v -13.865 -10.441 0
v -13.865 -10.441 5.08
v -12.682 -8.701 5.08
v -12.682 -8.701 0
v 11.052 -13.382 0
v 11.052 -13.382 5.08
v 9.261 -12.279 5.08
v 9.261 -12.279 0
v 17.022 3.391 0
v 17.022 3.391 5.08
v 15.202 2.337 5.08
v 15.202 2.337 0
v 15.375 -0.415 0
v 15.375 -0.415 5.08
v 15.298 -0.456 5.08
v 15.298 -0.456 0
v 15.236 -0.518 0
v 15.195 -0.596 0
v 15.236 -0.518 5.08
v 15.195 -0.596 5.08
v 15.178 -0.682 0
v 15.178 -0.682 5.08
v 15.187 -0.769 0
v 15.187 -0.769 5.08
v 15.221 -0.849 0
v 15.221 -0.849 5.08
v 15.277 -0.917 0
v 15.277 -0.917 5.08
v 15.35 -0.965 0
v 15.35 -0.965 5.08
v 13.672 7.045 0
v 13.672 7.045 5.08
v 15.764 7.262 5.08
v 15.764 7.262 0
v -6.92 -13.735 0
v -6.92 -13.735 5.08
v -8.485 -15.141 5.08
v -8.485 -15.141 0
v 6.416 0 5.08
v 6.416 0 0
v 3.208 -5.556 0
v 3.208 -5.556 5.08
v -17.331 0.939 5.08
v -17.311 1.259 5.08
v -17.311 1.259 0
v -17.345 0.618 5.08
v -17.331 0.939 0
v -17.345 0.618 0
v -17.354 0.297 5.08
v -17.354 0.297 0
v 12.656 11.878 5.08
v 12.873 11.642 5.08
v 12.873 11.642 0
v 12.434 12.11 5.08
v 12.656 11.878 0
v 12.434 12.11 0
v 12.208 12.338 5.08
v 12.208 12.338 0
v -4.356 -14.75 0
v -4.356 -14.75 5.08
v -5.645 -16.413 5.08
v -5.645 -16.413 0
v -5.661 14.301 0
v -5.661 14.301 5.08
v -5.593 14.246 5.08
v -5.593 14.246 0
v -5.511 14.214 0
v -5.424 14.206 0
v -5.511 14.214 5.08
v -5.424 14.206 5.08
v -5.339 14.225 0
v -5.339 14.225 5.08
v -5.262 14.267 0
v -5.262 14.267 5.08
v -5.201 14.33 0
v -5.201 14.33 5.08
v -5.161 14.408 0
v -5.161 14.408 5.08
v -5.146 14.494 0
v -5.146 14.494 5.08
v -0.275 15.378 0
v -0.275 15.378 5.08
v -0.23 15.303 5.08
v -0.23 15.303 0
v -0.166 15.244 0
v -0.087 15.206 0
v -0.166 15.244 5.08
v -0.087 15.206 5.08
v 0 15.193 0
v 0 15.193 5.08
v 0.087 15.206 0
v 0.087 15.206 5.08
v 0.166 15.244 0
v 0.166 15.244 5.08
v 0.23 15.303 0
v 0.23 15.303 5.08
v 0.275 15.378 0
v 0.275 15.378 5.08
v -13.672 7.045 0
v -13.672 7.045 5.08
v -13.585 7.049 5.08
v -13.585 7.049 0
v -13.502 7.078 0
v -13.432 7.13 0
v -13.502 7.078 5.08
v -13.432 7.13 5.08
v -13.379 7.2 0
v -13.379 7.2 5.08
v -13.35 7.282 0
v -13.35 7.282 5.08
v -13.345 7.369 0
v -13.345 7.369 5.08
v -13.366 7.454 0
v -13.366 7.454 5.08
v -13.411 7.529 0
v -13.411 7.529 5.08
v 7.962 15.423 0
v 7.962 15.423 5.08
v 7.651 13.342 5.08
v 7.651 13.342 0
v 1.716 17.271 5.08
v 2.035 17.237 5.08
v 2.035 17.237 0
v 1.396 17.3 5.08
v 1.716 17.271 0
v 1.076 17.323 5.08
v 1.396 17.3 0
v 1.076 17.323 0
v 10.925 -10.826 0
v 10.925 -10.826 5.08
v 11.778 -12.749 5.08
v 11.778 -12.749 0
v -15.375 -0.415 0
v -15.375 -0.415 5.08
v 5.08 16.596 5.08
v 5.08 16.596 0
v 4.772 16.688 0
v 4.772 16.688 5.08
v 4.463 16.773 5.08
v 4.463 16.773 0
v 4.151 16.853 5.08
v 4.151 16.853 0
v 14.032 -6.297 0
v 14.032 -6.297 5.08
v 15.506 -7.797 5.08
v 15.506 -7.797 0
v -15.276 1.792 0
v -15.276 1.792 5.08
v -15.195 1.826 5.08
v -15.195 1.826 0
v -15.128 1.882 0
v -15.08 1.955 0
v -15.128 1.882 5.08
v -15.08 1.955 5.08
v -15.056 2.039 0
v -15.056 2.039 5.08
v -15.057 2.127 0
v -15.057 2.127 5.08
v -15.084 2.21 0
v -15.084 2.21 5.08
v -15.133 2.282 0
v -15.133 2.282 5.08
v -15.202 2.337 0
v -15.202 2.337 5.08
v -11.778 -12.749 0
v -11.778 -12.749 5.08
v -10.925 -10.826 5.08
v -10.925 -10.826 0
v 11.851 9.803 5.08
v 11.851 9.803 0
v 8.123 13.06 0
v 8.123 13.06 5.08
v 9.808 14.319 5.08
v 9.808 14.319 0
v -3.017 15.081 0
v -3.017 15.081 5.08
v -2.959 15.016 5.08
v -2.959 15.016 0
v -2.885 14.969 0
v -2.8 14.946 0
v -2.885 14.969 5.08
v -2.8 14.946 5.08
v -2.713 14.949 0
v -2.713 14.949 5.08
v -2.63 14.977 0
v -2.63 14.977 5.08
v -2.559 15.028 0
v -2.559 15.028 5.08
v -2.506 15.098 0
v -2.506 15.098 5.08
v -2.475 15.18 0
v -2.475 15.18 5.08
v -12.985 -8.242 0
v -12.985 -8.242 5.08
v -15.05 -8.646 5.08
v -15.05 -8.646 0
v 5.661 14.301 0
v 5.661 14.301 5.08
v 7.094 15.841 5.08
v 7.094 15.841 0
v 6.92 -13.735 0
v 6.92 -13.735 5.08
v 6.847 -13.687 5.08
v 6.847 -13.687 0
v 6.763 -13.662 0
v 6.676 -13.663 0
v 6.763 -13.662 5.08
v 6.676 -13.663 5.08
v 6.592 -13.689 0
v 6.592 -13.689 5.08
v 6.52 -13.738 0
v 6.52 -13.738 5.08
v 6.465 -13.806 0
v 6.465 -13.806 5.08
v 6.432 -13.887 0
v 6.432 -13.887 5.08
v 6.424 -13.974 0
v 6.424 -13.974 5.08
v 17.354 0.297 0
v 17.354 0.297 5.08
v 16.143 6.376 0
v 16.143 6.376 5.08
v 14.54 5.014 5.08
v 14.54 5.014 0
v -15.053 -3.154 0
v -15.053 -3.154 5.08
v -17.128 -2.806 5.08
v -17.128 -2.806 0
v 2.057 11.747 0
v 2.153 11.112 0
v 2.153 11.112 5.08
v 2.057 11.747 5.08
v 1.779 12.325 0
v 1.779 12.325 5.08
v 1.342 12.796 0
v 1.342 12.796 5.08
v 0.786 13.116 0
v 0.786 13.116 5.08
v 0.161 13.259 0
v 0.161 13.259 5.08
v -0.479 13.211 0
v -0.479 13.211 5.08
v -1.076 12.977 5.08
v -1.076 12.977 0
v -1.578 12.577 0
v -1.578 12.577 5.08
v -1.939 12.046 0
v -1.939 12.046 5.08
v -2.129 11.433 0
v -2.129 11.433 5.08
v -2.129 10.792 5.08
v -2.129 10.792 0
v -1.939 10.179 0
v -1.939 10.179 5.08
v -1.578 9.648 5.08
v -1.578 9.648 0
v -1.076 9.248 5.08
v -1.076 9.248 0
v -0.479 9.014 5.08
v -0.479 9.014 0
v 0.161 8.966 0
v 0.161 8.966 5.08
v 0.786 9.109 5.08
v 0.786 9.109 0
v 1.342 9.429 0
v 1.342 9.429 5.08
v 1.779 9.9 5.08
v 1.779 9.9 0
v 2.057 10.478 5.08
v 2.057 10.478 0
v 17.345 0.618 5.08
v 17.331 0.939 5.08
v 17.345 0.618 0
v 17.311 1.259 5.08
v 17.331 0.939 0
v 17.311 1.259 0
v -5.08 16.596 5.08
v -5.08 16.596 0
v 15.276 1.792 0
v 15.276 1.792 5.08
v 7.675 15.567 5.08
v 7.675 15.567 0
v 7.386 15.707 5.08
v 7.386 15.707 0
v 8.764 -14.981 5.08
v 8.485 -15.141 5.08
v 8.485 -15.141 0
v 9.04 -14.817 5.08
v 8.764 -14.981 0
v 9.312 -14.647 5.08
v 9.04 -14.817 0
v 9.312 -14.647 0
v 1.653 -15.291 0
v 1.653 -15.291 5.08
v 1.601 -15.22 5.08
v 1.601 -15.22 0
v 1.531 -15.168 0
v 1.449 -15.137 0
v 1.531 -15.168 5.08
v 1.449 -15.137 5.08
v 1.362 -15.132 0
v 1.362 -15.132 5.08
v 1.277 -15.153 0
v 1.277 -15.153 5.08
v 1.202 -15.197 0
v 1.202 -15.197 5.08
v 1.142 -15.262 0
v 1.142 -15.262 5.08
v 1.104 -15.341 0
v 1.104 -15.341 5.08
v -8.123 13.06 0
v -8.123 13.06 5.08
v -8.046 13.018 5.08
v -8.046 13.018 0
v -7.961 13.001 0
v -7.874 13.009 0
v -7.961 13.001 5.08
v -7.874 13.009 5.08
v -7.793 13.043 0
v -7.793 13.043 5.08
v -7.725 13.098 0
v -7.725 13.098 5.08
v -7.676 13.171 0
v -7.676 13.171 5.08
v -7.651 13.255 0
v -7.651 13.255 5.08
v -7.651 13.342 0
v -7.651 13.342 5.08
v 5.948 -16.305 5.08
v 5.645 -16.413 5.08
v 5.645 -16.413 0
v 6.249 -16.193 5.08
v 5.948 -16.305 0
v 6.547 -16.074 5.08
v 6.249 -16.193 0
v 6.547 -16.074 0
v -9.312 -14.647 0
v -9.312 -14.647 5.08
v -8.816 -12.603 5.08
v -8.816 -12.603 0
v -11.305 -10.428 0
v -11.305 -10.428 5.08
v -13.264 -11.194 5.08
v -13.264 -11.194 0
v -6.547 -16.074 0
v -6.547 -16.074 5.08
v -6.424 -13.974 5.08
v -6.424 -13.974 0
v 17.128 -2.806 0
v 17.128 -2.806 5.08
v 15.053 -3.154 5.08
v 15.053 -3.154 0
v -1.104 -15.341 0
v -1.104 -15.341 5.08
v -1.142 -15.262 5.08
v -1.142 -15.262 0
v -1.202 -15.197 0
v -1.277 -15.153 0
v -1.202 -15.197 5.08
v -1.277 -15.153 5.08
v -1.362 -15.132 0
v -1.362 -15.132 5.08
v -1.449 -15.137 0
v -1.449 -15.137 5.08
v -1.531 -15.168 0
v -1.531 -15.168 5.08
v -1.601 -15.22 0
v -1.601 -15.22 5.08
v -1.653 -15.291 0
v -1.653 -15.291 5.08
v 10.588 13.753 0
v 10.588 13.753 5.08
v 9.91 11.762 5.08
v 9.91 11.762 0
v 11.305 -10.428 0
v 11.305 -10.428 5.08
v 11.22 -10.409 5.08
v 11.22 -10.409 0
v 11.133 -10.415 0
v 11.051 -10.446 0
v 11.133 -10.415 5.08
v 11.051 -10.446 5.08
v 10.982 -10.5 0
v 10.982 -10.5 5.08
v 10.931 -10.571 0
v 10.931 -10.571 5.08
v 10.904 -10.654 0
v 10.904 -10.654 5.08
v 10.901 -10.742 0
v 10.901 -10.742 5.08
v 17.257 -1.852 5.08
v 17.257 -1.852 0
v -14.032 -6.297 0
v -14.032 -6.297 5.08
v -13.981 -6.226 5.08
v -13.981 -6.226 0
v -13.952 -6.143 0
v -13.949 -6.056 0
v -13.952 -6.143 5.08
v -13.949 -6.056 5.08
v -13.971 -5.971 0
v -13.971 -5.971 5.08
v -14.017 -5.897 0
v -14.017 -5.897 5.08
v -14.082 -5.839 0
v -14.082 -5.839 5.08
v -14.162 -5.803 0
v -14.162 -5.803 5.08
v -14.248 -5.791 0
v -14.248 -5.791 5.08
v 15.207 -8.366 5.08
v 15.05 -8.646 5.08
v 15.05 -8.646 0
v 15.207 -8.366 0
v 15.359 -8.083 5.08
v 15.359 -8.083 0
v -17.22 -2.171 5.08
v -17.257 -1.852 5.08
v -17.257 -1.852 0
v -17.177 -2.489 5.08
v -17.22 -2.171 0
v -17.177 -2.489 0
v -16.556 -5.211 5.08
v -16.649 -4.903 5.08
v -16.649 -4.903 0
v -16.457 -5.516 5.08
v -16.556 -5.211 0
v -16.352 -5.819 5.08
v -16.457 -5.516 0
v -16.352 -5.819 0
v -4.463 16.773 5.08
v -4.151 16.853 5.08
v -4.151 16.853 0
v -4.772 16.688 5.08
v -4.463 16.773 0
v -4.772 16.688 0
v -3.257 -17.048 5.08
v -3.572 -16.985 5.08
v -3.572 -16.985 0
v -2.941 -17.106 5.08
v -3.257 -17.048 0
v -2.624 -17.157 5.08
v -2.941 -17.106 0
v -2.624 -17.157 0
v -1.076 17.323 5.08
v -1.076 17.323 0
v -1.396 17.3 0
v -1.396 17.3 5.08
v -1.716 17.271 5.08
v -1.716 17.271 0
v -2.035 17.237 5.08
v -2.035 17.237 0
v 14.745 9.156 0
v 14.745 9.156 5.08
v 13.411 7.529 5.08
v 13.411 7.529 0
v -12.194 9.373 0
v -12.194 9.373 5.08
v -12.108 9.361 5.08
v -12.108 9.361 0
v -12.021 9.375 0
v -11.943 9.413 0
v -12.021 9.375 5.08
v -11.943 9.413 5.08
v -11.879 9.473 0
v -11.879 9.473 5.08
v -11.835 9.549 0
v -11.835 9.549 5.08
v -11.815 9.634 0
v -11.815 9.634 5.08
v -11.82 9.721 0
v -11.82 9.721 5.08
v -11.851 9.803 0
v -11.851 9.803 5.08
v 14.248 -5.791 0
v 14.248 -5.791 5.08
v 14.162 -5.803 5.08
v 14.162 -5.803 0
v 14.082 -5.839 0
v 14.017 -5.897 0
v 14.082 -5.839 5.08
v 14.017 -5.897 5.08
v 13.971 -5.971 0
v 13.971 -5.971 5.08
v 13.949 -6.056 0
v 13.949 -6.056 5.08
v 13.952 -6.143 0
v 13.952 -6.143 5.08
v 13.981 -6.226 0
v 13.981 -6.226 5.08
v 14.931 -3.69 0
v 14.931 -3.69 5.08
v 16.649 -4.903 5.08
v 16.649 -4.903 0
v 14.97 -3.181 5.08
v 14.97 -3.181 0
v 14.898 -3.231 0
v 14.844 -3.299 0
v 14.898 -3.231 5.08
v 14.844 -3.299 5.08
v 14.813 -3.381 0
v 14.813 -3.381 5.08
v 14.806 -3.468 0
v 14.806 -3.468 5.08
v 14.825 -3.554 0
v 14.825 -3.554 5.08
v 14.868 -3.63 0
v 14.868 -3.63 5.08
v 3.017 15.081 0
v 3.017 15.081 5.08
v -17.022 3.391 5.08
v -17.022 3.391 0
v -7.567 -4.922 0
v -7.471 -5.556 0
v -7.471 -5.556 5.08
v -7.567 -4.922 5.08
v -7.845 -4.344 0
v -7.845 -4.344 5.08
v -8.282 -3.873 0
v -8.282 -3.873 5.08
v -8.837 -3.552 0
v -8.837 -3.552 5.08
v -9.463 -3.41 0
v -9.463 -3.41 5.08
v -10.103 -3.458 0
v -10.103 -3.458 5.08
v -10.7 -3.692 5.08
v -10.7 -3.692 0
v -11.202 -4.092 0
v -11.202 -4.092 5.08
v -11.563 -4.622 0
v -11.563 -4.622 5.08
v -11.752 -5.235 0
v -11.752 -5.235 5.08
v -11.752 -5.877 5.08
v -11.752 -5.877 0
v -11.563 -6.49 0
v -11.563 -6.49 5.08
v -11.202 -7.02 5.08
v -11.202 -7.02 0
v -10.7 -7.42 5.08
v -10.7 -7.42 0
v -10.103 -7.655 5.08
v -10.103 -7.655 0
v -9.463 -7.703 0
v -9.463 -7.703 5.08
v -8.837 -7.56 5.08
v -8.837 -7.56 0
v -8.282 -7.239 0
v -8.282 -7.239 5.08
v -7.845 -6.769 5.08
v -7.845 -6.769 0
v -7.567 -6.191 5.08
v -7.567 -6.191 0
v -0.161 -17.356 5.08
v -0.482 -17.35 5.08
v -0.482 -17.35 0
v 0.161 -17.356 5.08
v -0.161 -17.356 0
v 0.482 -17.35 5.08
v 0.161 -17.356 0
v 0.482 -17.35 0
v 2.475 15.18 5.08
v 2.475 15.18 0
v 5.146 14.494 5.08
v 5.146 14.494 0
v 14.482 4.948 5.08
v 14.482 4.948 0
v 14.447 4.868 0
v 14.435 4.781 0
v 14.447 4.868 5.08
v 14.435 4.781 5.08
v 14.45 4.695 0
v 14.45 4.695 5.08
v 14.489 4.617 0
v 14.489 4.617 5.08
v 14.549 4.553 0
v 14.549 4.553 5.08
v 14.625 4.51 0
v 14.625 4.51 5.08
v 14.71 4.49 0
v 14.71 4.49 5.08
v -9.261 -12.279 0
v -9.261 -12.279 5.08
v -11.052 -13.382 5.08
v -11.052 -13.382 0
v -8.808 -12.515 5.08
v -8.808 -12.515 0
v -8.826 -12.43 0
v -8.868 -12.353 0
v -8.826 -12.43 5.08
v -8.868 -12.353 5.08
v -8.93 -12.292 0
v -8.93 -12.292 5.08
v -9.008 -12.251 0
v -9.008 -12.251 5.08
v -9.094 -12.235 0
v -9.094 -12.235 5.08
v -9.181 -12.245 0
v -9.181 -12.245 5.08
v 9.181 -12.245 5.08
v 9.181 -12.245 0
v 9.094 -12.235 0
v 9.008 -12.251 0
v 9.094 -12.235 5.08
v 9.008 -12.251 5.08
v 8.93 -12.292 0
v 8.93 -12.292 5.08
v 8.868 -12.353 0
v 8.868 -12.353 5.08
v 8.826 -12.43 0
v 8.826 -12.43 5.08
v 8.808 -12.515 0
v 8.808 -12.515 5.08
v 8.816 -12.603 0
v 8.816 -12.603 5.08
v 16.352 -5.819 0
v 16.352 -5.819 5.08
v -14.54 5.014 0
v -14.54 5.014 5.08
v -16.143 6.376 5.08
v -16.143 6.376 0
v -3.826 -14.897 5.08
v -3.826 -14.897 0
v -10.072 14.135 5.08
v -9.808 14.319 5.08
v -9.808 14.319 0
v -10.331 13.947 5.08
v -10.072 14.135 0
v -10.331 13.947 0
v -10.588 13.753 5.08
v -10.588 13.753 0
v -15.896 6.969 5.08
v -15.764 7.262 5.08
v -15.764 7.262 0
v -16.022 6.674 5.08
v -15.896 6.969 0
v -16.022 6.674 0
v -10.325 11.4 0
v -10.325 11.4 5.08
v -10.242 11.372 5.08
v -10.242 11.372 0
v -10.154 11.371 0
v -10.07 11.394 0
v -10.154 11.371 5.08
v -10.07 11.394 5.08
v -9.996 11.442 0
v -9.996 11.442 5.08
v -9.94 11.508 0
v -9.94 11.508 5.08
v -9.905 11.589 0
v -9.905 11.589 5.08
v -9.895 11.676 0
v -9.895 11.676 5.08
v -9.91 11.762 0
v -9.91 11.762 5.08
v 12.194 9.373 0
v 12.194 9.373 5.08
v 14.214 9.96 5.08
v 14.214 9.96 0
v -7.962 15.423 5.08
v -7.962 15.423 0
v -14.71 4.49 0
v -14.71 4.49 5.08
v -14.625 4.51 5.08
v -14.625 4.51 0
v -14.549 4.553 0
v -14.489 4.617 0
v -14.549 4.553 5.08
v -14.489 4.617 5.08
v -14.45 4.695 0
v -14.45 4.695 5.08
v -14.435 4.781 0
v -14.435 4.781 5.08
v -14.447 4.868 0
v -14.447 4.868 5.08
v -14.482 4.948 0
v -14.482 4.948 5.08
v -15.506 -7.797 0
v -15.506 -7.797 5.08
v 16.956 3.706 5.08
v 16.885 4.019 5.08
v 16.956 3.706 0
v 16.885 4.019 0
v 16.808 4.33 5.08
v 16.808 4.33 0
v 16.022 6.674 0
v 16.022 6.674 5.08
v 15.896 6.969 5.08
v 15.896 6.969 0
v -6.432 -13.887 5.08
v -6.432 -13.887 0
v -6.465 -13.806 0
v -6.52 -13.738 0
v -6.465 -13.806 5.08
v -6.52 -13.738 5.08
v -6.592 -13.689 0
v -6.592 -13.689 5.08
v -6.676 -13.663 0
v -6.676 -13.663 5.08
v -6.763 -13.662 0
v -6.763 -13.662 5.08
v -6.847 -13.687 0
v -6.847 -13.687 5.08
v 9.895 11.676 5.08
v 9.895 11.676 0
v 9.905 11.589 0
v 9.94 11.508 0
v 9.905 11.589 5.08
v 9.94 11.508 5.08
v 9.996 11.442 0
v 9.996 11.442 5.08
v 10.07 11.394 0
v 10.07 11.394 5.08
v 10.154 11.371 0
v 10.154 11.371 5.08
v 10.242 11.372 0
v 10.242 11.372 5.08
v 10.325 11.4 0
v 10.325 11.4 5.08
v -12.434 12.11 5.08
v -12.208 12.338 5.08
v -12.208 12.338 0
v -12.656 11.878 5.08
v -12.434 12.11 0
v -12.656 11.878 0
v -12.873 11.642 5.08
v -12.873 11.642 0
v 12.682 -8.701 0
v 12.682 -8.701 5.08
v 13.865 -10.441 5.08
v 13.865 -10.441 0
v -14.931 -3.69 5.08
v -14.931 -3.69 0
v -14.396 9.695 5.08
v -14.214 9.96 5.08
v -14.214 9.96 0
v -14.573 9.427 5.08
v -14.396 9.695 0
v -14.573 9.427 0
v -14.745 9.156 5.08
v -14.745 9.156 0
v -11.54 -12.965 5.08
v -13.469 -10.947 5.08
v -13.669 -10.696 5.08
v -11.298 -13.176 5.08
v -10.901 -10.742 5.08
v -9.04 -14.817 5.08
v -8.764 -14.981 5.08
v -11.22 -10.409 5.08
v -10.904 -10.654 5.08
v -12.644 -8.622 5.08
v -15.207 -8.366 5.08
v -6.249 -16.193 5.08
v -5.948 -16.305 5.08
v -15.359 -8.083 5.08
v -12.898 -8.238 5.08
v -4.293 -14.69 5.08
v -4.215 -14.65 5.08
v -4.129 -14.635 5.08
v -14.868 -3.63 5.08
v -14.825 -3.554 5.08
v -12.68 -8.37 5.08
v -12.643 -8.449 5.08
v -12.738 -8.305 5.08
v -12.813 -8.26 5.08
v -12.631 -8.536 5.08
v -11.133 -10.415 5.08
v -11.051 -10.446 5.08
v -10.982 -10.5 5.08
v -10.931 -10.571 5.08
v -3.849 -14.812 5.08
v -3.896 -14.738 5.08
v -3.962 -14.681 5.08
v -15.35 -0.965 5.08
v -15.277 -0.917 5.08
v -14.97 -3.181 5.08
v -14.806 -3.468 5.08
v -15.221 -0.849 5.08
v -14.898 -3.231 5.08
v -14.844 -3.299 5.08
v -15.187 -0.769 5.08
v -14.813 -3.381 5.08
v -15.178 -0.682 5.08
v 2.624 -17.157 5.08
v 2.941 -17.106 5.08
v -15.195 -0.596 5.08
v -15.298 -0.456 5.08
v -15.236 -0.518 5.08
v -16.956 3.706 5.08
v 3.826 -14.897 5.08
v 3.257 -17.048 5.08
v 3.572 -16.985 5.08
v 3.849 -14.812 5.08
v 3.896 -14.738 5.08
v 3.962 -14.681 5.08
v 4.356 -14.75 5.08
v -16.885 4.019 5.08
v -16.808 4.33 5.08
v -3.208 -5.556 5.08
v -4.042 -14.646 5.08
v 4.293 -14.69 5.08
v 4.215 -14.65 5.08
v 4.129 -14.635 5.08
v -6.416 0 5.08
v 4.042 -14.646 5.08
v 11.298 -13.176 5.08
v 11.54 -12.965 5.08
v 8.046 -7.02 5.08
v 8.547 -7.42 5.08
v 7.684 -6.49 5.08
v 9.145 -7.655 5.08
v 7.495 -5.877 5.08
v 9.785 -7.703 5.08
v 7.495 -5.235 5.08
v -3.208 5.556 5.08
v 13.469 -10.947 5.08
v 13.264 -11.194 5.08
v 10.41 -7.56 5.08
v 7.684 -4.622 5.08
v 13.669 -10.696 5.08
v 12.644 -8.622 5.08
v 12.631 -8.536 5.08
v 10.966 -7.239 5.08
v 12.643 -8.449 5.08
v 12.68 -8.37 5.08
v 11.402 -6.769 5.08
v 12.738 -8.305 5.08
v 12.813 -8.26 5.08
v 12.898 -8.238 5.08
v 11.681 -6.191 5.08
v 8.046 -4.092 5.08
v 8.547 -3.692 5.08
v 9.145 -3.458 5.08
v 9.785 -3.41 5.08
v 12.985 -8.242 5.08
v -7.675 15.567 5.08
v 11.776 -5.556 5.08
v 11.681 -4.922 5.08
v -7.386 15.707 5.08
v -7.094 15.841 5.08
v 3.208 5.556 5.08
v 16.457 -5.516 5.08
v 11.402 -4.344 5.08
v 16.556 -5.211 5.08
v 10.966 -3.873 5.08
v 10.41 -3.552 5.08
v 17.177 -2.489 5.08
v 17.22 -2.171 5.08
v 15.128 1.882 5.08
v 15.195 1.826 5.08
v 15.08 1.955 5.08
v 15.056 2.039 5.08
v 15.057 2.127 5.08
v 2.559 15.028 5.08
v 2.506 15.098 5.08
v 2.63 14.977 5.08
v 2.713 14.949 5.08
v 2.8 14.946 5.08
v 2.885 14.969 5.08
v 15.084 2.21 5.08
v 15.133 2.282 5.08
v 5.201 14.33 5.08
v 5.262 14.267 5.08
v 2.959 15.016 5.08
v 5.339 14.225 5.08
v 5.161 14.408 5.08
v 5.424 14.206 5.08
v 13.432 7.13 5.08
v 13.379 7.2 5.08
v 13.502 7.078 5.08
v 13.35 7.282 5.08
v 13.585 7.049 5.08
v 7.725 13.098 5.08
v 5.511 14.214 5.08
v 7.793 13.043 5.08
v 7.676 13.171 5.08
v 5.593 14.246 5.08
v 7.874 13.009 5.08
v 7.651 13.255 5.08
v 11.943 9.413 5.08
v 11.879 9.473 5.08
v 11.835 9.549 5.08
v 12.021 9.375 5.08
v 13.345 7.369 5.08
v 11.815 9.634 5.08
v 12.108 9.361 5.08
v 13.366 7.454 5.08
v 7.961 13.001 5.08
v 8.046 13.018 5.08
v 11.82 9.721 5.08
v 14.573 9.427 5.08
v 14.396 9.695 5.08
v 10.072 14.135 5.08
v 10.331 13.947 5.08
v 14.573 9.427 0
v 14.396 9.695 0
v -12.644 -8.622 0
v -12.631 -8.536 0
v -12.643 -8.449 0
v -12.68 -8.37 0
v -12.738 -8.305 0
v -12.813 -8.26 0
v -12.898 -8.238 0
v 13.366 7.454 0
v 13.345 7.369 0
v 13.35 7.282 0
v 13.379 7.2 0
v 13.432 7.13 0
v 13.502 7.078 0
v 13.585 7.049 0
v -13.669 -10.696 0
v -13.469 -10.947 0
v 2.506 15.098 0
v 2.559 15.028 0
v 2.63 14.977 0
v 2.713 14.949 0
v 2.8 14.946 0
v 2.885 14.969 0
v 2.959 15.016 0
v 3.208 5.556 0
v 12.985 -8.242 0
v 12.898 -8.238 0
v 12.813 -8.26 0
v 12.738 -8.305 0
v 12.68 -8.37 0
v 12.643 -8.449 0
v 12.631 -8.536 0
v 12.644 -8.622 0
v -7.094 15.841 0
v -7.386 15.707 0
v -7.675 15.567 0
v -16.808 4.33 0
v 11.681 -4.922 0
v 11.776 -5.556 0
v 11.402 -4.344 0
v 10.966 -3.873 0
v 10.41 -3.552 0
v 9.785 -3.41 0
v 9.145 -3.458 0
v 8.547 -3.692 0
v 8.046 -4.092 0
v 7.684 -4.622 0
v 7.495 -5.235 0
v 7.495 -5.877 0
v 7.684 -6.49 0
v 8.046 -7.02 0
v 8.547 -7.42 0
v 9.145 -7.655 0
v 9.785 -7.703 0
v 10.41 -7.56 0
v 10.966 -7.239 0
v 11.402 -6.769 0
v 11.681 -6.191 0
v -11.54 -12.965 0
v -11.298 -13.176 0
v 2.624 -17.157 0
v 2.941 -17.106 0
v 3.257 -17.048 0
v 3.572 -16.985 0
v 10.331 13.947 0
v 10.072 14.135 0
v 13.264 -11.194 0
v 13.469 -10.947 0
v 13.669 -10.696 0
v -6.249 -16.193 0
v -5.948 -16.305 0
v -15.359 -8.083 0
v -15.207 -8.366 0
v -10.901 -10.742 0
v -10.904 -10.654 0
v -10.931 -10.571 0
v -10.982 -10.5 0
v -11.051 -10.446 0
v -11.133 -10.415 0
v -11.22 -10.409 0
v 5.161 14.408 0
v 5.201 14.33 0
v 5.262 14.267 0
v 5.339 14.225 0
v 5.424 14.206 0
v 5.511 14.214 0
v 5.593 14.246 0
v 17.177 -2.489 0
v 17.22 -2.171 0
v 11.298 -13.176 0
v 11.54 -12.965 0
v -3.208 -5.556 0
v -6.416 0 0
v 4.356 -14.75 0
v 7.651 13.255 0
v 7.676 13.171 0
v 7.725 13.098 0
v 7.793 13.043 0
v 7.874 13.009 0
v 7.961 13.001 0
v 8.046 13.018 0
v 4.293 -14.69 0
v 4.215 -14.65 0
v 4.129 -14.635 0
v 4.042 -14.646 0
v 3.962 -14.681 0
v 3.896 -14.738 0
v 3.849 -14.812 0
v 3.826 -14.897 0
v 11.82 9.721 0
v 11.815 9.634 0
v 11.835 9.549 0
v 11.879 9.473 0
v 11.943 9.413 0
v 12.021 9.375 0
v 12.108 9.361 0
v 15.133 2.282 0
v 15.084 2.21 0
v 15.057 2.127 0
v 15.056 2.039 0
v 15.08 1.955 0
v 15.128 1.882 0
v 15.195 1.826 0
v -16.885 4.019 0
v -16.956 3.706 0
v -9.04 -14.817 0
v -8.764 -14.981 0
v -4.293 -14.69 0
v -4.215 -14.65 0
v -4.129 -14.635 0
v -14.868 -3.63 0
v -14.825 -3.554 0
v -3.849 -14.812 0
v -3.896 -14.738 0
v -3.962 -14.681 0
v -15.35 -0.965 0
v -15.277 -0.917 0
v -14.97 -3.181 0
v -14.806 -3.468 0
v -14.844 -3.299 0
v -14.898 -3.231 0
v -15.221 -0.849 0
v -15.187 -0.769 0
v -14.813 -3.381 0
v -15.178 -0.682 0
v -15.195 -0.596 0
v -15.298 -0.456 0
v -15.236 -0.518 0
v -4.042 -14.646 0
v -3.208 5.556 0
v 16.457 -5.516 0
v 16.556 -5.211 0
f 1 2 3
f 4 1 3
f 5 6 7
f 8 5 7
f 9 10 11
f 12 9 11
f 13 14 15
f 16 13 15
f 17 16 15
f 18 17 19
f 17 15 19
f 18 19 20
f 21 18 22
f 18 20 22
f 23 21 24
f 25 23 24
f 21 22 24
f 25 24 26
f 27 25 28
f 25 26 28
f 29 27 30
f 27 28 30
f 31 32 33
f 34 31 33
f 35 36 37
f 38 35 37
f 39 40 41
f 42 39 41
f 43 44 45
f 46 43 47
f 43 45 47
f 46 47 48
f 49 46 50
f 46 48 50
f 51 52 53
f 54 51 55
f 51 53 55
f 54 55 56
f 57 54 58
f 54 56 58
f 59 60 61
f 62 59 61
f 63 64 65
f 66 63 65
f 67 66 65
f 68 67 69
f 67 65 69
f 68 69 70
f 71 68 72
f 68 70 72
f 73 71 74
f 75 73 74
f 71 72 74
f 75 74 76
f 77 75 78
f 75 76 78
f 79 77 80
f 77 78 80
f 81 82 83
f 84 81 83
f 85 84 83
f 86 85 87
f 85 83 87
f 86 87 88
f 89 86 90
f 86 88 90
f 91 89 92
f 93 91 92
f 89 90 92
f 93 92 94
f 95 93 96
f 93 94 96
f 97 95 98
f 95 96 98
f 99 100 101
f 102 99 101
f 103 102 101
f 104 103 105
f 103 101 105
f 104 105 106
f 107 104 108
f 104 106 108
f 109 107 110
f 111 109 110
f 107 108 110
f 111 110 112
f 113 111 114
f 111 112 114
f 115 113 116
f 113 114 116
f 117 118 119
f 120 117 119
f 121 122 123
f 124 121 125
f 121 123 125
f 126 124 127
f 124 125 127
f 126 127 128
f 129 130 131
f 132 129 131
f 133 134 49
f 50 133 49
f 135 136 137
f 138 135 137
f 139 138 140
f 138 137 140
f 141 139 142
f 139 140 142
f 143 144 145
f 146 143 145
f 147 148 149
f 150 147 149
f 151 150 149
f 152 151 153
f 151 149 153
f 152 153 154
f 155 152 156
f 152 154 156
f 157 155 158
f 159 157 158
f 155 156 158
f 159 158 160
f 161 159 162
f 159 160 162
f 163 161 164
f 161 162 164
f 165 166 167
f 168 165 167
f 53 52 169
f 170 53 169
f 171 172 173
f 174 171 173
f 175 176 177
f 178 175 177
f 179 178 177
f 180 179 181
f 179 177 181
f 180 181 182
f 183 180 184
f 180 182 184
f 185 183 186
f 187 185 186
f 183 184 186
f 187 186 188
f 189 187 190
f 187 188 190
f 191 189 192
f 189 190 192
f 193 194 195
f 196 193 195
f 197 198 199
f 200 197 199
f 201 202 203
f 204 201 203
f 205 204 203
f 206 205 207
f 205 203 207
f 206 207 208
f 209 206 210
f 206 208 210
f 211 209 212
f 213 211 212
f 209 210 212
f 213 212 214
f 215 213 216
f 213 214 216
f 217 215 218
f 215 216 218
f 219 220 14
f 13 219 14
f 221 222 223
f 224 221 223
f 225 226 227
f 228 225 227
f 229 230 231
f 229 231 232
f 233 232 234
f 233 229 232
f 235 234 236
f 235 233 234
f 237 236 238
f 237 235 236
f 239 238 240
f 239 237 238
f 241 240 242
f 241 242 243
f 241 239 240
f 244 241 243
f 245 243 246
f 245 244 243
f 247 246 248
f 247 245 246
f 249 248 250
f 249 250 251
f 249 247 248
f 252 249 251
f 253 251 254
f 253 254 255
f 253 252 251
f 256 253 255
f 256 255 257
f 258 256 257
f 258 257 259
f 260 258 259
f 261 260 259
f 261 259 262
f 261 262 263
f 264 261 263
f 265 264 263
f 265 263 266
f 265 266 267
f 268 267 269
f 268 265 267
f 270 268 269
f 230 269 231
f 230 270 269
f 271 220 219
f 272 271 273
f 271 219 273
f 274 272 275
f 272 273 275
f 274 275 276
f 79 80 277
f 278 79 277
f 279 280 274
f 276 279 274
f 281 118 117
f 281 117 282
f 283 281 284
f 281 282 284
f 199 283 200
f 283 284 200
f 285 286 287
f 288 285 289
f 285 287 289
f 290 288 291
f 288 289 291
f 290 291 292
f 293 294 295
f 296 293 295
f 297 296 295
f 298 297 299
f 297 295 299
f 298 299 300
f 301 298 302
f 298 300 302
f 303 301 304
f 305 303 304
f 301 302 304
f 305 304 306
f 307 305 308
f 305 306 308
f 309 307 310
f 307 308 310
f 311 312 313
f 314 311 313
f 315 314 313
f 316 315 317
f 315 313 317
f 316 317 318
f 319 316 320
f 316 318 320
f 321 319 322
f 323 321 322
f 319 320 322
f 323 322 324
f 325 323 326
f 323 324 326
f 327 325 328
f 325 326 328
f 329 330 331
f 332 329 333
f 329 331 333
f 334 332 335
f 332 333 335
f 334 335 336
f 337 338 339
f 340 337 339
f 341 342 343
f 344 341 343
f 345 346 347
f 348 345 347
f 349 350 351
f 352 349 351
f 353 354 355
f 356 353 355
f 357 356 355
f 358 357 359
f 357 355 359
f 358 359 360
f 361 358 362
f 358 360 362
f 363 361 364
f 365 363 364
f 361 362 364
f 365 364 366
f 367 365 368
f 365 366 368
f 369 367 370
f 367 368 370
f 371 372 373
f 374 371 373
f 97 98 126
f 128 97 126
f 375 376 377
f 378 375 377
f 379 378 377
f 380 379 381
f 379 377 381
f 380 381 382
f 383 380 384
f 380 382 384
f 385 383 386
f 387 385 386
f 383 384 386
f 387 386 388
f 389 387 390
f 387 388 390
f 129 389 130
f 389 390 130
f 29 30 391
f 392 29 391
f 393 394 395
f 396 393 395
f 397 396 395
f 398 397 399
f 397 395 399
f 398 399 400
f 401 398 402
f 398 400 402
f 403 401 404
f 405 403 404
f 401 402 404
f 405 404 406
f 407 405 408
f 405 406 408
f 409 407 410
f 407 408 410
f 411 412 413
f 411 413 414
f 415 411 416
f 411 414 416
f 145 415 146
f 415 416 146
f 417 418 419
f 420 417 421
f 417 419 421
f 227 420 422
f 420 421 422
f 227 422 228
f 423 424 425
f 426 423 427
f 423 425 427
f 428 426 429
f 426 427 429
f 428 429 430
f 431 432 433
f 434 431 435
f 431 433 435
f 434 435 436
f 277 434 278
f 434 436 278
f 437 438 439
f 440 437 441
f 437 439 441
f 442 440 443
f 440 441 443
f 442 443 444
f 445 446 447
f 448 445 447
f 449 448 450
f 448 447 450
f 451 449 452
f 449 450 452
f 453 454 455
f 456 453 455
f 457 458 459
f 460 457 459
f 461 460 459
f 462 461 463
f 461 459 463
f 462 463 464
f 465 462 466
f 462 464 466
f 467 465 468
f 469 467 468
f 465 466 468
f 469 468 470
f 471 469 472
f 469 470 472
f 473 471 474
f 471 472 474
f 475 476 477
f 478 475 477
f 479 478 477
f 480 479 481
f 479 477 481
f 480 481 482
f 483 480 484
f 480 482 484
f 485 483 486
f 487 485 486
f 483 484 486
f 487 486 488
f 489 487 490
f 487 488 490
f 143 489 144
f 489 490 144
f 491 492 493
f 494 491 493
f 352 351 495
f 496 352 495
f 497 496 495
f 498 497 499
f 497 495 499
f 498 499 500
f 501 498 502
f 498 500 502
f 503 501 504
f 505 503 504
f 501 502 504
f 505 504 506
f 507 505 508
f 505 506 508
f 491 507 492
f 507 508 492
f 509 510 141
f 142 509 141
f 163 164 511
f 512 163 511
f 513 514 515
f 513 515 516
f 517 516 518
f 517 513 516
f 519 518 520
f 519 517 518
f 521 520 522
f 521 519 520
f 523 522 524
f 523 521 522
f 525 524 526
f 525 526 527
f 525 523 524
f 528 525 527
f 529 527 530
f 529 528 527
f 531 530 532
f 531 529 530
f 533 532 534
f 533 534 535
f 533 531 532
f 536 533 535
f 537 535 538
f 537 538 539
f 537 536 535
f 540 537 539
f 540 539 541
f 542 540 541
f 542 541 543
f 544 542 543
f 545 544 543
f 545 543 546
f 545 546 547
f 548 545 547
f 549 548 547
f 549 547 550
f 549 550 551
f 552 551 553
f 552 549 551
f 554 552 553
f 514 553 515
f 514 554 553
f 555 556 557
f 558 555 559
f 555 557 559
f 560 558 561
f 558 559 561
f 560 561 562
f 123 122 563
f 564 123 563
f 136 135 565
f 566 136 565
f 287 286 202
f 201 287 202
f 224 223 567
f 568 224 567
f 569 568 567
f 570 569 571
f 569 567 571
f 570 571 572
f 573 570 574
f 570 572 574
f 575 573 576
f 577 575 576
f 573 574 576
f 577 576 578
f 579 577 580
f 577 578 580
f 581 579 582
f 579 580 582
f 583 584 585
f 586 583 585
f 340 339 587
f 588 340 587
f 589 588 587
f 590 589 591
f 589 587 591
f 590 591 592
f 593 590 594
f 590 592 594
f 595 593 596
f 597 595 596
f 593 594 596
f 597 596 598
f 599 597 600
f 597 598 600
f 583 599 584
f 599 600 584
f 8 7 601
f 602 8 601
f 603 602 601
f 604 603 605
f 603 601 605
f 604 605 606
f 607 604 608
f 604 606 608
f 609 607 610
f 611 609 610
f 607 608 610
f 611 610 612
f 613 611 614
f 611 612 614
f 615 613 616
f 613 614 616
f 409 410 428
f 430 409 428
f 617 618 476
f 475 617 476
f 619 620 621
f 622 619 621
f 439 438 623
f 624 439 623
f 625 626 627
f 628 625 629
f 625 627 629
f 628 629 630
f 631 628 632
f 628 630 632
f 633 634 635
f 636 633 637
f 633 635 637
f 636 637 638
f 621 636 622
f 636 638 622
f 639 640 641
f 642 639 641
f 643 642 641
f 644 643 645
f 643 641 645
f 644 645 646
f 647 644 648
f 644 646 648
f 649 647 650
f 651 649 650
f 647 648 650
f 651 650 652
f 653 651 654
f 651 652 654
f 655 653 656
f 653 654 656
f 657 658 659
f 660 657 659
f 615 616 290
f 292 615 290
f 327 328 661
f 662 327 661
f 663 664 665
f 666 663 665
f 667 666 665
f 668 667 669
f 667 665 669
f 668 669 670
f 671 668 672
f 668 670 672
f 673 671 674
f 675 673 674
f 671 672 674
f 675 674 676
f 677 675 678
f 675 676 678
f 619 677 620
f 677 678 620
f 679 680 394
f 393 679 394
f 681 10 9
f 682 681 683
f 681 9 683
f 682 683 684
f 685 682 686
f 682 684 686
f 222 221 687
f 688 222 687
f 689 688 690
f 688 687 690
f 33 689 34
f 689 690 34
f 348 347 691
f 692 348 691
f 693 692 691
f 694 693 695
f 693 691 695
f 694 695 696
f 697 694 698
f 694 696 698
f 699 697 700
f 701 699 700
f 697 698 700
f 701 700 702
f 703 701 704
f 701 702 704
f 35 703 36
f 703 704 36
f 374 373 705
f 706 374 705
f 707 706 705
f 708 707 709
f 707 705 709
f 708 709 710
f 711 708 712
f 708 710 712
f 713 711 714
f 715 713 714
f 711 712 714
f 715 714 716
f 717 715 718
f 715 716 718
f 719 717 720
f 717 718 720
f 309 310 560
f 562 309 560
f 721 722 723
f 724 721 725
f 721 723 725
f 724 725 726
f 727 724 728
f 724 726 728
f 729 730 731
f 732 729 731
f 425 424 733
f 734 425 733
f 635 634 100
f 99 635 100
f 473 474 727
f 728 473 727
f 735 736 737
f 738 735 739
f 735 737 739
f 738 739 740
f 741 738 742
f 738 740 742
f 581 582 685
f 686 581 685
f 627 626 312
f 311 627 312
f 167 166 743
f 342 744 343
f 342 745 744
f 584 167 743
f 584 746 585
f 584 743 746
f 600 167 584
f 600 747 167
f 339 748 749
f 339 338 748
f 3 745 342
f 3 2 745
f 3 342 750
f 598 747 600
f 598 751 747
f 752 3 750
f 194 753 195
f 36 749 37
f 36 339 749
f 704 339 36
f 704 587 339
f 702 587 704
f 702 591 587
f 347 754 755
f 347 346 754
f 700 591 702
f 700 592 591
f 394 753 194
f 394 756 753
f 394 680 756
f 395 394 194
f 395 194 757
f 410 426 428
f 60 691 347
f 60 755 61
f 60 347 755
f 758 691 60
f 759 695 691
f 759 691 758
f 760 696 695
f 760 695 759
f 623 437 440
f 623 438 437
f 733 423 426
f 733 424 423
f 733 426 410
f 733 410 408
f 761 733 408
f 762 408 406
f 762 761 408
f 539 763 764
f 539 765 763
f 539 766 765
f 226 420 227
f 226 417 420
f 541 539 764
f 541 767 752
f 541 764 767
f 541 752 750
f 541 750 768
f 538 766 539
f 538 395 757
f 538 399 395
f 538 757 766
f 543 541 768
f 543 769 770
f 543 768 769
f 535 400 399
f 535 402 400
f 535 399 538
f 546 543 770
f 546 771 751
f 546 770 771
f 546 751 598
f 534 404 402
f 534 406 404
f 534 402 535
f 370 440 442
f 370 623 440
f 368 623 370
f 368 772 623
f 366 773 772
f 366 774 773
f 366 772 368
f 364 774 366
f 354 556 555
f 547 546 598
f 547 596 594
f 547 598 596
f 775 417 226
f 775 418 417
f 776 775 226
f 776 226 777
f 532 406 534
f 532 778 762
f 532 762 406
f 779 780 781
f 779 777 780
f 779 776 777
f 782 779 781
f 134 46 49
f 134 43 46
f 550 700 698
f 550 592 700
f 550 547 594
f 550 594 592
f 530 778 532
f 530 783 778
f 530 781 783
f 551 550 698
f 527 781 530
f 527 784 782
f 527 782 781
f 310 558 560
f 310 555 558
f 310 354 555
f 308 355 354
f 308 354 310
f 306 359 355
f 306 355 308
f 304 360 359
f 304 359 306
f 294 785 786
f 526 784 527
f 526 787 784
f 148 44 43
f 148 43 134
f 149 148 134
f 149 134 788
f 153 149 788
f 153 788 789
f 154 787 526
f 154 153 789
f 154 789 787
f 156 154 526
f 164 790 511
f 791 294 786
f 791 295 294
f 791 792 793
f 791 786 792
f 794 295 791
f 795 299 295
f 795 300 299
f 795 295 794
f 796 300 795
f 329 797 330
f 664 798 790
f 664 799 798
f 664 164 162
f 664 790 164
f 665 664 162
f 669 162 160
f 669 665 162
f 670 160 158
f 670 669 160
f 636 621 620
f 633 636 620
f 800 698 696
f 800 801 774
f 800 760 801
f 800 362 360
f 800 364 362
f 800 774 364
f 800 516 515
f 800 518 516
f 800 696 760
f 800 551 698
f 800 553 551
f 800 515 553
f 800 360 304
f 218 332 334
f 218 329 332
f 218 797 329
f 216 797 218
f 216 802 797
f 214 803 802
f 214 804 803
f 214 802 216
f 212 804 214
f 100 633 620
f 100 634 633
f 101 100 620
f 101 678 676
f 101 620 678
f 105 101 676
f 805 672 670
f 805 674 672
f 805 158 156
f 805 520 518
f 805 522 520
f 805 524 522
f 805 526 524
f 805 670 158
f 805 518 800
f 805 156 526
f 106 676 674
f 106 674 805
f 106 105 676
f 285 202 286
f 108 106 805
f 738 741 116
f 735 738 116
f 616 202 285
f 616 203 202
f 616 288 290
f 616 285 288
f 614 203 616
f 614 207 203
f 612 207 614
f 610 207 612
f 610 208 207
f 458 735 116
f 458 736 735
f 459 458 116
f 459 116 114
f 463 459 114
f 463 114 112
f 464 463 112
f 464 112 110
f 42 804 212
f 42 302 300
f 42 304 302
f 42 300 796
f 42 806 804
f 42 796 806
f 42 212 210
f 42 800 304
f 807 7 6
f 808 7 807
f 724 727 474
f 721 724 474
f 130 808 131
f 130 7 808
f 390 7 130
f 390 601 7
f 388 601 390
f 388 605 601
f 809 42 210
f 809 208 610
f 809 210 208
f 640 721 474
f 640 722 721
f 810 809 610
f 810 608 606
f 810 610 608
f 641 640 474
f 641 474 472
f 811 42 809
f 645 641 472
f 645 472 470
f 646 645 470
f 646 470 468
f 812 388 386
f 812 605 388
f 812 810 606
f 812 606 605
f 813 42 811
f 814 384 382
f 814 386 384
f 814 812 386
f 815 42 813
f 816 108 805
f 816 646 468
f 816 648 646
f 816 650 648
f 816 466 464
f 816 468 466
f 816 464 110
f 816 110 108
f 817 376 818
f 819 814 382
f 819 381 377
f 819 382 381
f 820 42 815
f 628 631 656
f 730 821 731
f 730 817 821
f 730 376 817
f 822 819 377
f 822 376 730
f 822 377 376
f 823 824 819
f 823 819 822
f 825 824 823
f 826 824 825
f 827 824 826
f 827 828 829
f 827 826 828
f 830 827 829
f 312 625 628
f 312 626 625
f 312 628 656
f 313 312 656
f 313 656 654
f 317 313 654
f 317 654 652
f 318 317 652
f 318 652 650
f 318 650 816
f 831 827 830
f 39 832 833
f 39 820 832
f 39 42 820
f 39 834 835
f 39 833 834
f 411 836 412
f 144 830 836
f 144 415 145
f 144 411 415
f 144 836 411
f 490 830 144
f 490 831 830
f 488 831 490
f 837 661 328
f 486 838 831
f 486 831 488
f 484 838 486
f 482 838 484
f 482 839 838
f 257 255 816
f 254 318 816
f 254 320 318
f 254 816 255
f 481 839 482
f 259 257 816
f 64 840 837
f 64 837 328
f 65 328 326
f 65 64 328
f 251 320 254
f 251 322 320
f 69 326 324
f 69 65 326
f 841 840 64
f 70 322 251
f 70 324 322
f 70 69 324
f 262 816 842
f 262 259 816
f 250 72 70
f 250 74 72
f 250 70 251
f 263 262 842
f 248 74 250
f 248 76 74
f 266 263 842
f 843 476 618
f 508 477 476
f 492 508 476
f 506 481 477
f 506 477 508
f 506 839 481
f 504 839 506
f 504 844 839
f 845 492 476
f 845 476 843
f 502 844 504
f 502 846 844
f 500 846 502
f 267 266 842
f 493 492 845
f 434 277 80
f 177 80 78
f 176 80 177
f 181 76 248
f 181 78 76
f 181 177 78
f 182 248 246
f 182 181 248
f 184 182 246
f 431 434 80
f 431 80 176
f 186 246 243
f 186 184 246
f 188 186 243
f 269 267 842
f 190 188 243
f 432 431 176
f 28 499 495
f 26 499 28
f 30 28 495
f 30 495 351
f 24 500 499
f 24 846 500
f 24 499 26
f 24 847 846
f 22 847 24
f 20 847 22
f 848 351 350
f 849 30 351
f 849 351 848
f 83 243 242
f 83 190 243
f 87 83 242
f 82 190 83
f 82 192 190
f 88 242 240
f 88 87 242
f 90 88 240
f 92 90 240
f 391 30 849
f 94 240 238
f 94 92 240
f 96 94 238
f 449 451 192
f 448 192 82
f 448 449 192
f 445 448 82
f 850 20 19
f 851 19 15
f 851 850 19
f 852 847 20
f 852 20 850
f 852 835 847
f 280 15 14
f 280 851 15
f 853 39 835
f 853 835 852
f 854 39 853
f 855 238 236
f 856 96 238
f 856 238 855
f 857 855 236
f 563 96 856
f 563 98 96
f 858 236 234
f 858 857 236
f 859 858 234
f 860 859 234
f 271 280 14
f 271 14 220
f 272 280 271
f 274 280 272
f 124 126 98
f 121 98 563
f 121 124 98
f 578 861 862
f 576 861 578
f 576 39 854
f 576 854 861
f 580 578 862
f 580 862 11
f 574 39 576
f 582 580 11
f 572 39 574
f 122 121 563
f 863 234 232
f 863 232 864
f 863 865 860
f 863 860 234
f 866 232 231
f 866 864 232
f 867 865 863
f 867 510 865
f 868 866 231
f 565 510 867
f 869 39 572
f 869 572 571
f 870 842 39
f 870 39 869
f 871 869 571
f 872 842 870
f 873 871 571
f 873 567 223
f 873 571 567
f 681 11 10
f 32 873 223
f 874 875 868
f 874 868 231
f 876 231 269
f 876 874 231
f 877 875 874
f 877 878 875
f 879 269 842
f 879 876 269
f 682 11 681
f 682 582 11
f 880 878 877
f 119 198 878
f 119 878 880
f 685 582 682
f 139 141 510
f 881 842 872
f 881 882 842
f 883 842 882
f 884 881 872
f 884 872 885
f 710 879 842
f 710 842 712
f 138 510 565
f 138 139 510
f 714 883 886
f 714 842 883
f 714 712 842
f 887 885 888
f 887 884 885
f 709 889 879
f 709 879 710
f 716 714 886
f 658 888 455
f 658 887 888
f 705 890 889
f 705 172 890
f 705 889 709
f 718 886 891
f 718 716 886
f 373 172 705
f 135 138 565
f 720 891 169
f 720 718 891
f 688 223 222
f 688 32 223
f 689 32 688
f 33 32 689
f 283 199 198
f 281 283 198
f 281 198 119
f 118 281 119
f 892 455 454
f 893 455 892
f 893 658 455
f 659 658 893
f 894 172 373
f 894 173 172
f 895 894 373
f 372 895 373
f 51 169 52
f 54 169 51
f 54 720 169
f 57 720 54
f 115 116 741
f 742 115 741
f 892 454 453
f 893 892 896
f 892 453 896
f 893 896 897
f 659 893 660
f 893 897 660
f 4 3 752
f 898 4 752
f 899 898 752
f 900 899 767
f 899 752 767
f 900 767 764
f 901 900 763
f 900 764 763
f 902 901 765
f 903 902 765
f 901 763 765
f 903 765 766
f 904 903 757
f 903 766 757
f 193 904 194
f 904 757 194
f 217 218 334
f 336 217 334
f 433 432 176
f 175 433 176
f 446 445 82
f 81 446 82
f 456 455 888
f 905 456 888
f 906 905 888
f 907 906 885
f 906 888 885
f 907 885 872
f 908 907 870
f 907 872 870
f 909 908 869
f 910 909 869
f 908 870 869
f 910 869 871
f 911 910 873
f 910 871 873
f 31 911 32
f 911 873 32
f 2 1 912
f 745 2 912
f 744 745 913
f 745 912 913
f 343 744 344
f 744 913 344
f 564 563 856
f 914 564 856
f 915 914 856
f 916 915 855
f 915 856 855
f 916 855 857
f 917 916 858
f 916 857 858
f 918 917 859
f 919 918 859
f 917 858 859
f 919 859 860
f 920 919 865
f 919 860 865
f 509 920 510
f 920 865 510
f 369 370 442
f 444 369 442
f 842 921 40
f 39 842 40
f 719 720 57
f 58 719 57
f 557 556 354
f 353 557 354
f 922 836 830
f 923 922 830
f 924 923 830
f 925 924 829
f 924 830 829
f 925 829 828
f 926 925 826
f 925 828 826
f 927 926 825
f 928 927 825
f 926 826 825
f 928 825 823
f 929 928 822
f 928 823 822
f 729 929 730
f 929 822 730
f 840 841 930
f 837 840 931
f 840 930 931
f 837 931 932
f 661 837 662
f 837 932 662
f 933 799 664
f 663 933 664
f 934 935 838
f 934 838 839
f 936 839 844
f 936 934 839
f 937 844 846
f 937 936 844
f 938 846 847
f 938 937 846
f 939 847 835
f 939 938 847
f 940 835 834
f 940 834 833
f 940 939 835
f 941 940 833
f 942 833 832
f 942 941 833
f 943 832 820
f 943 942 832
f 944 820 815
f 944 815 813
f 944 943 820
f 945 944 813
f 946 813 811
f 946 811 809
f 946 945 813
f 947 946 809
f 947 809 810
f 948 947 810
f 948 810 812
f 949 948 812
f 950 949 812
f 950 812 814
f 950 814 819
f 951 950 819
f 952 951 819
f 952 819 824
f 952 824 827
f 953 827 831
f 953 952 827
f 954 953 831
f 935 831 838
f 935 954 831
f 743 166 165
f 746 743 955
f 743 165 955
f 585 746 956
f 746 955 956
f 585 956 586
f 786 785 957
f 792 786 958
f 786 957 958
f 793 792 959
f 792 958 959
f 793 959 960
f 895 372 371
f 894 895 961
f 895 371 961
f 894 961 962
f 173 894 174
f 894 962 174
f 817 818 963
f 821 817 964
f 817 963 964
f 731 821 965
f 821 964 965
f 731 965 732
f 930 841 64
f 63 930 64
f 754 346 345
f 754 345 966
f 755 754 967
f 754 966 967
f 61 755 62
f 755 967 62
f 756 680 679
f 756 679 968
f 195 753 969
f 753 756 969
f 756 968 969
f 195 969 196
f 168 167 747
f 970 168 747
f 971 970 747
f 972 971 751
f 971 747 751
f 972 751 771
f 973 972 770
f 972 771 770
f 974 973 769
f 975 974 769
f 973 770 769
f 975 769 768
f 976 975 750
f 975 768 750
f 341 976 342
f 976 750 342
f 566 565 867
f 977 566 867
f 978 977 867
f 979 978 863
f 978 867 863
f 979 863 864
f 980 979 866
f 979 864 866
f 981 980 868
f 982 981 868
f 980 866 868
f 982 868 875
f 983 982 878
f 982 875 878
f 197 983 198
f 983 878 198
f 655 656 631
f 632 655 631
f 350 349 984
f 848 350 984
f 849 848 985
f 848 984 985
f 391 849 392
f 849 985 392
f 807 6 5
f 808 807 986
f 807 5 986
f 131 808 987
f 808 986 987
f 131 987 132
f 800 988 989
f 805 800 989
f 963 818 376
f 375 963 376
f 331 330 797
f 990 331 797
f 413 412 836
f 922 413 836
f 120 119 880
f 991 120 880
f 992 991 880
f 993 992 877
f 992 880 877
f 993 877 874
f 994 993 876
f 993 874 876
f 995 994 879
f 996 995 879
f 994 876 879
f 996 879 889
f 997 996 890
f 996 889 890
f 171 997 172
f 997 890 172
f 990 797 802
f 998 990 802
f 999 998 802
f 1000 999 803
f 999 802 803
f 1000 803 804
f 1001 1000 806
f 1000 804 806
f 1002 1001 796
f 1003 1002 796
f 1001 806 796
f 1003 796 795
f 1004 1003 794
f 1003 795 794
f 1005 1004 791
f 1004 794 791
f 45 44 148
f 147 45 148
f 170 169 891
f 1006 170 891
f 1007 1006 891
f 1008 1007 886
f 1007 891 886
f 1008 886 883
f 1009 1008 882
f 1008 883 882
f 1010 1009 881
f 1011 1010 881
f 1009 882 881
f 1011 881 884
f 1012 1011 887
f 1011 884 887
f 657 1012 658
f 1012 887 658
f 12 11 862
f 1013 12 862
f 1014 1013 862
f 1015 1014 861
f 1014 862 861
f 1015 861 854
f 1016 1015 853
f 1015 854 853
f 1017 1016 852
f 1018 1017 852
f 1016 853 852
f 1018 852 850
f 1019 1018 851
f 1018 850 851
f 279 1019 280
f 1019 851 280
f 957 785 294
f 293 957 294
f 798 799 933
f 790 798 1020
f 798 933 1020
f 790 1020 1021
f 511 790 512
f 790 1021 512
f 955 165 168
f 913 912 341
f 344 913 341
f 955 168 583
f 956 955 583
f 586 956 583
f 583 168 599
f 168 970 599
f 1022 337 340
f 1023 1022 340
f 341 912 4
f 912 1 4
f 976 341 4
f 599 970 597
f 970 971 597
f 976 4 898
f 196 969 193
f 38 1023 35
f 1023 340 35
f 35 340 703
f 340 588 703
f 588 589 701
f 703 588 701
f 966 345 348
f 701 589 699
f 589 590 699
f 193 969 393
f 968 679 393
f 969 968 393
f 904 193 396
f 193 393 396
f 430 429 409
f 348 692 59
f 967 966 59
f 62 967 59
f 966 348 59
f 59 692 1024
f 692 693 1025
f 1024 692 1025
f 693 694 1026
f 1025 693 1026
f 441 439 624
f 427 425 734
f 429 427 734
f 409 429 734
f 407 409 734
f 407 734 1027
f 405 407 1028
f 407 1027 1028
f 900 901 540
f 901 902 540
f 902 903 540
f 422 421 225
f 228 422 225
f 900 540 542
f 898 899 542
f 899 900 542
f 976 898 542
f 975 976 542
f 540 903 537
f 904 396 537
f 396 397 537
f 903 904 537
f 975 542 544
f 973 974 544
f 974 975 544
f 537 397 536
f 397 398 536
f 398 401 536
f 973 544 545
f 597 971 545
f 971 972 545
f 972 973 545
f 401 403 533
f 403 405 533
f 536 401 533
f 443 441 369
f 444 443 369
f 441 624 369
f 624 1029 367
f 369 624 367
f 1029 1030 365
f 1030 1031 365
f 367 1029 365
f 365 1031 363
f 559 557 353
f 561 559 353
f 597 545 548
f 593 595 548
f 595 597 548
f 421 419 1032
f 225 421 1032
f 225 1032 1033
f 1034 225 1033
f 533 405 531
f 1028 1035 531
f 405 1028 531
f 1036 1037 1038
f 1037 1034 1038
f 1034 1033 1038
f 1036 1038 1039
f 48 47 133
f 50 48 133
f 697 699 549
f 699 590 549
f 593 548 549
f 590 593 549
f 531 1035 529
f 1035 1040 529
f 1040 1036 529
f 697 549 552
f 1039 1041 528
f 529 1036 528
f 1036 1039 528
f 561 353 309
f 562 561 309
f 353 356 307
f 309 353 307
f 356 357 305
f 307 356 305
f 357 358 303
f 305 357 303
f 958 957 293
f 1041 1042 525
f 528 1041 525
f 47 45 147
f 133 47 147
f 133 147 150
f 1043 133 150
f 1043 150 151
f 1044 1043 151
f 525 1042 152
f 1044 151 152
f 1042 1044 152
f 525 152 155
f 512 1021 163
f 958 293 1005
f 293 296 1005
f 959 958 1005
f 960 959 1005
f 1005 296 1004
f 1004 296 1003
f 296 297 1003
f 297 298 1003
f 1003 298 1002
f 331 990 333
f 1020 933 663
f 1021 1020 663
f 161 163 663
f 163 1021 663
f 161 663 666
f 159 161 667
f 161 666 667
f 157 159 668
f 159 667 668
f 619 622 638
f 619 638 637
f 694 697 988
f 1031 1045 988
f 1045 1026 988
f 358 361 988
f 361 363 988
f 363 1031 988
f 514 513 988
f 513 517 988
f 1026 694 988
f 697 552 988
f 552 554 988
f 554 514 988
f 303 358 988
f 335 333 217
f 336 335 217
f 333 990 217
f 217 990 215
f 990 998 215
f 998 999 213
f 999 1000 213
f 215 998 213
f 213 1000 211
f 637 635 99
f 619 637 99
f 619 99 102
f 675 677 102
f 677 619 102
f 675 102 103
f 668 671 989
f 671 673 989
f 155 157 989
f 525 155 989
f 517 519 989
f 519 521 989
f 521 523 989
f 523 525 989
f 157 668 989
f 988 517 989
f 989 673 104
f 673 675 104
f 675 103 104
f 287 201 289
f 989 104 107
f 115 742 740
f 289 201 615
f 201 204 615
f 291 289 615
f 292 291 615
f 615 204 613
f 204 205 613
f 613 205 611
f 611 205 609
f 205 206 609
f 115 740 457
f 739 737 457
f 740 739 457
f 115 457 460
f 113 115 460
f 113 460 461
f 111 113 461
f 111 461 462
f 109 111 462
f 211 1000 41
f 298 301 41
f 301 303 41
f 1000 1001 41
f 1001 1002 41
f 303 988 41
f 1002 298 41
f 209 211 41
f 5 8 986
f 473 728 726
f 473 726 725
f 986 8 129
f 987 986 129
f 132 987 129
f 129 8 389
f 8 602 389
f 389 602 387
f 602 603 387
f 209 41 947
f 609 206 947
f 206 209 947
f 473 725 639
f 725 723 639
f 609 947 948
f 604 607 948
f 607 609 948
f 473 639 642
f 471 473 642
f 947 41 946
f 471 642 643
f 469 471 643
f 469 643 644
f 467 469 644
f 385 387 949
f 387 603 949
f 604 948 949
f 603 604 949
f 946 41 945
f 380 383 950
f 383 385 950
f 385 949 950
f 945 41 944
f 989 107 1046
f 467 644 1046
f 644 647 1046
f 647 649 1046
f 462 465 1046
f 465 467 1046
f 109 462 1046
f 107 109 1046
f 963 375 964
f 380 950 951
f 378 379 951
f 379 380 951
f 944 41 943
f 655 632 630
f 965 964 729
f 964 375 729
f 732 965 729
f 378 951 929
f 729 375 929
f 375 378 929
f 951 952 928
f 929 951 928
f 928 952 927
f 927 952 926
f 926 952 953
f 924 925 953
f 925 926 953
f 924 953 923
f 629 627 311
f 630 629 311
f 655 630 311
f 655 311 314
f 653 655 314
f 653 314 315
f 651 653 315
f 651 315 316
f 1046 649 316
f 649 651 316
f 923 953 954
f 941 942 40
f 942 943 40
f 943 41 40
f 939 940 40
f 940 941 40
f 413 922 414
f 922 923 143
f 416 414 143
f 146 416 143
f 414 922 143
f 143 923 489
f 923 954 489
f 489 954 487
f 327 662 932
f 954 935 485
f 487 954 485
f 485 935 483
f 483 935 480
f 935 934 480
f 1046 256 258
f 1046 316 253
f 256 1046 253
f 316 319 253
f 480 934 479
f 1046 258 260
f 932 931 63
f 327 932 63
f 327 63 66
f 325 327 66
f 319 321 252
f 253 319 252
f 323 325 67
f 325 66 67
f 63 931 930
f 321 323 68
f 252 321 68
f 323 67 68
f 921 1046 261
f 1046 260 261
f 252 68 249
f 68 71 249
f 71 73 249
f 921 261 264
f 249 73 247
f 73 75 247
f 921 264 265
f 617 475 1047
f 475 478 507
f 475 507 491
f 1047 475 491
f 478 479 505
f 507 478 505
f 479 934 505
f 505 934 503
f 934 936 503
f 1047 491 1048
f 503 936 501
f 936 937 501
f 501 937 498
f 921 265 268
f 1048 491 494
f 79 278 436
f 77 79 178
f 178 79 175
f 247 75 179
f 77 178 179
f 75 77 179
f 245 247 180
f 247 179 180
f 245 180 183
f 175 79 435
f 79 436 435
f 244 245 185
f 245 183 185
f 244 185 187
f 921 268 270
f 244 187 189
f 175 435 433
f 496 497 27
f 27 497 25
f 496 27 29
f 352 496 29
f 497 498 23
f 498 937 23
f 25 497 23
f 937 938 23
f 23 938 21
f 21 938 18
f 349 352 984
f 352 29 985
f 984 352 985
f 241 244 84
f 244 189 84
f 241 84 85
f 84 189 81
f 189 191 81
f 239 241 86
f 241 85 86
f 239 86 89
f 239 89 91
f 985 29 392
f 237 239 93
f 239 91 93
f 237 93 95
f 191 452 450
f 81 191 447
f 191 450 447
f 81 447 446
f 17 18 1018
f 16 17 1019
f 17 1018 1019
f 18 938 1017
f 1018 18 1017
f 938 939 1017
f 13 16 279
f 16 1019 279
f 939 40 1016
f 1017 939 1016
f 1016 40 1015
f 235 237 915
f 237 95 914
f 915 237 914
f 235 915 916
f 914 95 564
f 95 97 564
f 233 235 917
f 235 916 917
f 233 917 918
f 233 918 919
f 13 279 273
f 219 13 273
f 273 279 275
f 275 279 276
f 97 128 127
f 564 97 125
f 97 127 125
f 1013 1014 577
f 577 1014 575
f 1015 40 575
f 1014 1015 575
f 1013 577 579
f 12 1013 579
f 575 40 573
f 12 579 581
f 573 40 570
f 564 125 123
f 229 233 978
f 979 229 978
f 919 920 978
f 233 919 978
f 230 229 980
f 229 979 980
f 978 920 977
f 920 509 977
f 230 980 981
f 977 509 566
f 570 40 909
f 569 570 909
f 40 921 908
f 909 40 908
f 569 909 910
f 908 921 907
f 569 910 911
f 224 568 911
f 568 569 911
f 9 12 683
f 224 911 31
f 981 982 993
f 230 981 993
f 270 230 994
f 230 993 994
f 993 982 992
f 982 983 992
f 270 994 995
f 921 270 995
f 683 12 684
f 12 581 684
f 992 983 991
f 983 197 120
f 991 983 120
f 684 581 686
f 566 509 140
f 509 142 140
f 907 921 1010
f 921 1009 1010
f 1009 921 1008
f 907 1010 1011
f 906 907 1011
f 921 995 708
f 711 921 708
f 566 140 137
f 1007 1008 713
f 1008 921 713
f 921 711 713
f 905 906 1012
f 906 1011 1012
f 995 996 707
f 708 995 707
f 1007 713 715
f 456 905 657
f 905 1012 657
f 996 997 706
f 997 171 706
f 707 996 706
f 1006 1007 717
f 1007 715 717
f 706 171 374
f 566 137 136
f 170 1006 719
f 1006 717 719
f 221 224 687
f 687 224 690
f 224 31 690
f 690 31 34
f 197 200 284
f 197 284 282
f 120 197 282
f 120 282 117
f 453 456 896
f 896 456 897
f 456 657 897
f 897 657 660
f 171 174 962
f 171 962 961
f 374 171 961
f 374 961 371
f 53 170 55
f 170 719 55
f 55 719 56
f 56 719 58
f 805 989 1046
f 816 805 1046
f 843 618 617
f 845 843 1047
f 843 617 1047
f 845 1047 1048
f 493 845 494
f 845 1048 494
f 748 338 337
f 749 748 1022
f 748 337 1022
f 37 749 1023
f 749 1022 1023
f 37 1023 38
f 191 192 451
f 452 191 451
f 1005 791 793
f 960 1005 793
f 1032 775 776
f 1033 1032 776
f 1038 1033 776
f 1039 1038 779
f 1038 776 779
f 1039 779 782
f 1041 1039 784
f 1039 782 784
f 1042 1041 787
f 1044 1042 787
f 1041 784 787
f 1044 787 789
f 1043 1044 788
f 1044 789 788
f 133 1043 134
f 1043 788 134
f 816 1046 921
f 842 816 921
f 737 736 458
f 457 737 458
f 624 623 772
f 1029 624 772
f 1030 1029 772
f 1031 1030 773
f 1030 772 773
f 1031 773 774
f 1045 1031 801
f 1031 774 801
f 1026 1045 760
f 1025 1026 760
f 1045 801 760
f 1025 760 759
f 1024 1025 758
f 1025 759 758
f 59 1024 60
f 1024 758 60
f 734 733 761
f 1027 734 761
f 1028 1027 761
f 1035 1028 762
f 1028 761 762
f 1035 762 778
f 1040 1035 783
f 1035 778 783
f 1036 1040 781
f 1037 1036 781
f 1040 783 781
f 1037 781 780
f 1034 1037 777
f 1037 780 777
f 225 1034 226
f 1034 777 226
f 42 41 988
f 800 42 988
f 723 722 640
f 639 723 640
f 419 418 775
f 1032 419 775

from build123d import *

# Parameters (mm, degrees)
F0_R            = 17.3565013667
F0_R_2          = 2.15265
F1_DEPTH        = 5.08
F3_DEPTH        = 5.08
F3_COPIES_COUNT = 35


# Not quite as in the source:
# - a pattern or mirror of a feature is missing from the dataset's text; its kind, count and spacing are read off the source's solid
# - a feature names something its author has since deleted; it is built from what else it names


with BuildPart() as f1:
    # F0 (on Top) → F1 (new body)
    with BuildSketch(Plane.XY):
        Circle(F0_R)
        with Locations((-9.6237072996, -5.55625)):
            Circle(F0_R_2, mode=Mode.SUBTRACT)
        with Locations((9.6237072996, -5.55625)):
            Circle(F0_R_2, mode=Mode.SUBTRACT)
        Polygon((6.4158048664, 0), (3.2079024332, -5.55625), (-3.2079024332, -5.55625), (-6.4158048664, 0), (-3.2079024332, 5.55625), (3.2079024332, 5.55625), align=None, mode=Mode.SUBTRACT)
        with Locations((0, 11.1125)):
            Circle(F0_R_2, mode=Mode.SUBTRACT)
    extrude(amount=F1_DEPTH)

    # F2 (on face) → F3 (cut, through all)
    with BuildSketch(Plane.XY.offset(5.08)):
        with BuildLine():
            Line((0.275157943, 15.3777549622), (1.0756124971, 17.3231405192))
            ThreePointArc((1.0756124971, 17.3231405192), (0, 17.3565013667), (-1.0756124971, 17.3231405192))
            Line((-1.0756124971, 17.3231405192), (-0.275157943, 15.3777549622))
            ThreePointArc((-0.275157943, 15.3777549622), (0, 15.1934323047), (0.275157943, 15.3777549622))
        make_face()
    f3 = extrude(amount=-F3_DEPTH, mode=Mode.SUBTRACT)

    # F3_copies: F3 ×35 about axis
    f3_copies_axis = Axis((0, 0, 0), (0, 0, 1))
    for i in range(1, F3_COPIES_COUNT):
        add(f3.rotate(f3_copies_axis, i * 360 / F3_COPIES_COUNT), mode=Mode.SUBTRACT)


solid = f1.part
